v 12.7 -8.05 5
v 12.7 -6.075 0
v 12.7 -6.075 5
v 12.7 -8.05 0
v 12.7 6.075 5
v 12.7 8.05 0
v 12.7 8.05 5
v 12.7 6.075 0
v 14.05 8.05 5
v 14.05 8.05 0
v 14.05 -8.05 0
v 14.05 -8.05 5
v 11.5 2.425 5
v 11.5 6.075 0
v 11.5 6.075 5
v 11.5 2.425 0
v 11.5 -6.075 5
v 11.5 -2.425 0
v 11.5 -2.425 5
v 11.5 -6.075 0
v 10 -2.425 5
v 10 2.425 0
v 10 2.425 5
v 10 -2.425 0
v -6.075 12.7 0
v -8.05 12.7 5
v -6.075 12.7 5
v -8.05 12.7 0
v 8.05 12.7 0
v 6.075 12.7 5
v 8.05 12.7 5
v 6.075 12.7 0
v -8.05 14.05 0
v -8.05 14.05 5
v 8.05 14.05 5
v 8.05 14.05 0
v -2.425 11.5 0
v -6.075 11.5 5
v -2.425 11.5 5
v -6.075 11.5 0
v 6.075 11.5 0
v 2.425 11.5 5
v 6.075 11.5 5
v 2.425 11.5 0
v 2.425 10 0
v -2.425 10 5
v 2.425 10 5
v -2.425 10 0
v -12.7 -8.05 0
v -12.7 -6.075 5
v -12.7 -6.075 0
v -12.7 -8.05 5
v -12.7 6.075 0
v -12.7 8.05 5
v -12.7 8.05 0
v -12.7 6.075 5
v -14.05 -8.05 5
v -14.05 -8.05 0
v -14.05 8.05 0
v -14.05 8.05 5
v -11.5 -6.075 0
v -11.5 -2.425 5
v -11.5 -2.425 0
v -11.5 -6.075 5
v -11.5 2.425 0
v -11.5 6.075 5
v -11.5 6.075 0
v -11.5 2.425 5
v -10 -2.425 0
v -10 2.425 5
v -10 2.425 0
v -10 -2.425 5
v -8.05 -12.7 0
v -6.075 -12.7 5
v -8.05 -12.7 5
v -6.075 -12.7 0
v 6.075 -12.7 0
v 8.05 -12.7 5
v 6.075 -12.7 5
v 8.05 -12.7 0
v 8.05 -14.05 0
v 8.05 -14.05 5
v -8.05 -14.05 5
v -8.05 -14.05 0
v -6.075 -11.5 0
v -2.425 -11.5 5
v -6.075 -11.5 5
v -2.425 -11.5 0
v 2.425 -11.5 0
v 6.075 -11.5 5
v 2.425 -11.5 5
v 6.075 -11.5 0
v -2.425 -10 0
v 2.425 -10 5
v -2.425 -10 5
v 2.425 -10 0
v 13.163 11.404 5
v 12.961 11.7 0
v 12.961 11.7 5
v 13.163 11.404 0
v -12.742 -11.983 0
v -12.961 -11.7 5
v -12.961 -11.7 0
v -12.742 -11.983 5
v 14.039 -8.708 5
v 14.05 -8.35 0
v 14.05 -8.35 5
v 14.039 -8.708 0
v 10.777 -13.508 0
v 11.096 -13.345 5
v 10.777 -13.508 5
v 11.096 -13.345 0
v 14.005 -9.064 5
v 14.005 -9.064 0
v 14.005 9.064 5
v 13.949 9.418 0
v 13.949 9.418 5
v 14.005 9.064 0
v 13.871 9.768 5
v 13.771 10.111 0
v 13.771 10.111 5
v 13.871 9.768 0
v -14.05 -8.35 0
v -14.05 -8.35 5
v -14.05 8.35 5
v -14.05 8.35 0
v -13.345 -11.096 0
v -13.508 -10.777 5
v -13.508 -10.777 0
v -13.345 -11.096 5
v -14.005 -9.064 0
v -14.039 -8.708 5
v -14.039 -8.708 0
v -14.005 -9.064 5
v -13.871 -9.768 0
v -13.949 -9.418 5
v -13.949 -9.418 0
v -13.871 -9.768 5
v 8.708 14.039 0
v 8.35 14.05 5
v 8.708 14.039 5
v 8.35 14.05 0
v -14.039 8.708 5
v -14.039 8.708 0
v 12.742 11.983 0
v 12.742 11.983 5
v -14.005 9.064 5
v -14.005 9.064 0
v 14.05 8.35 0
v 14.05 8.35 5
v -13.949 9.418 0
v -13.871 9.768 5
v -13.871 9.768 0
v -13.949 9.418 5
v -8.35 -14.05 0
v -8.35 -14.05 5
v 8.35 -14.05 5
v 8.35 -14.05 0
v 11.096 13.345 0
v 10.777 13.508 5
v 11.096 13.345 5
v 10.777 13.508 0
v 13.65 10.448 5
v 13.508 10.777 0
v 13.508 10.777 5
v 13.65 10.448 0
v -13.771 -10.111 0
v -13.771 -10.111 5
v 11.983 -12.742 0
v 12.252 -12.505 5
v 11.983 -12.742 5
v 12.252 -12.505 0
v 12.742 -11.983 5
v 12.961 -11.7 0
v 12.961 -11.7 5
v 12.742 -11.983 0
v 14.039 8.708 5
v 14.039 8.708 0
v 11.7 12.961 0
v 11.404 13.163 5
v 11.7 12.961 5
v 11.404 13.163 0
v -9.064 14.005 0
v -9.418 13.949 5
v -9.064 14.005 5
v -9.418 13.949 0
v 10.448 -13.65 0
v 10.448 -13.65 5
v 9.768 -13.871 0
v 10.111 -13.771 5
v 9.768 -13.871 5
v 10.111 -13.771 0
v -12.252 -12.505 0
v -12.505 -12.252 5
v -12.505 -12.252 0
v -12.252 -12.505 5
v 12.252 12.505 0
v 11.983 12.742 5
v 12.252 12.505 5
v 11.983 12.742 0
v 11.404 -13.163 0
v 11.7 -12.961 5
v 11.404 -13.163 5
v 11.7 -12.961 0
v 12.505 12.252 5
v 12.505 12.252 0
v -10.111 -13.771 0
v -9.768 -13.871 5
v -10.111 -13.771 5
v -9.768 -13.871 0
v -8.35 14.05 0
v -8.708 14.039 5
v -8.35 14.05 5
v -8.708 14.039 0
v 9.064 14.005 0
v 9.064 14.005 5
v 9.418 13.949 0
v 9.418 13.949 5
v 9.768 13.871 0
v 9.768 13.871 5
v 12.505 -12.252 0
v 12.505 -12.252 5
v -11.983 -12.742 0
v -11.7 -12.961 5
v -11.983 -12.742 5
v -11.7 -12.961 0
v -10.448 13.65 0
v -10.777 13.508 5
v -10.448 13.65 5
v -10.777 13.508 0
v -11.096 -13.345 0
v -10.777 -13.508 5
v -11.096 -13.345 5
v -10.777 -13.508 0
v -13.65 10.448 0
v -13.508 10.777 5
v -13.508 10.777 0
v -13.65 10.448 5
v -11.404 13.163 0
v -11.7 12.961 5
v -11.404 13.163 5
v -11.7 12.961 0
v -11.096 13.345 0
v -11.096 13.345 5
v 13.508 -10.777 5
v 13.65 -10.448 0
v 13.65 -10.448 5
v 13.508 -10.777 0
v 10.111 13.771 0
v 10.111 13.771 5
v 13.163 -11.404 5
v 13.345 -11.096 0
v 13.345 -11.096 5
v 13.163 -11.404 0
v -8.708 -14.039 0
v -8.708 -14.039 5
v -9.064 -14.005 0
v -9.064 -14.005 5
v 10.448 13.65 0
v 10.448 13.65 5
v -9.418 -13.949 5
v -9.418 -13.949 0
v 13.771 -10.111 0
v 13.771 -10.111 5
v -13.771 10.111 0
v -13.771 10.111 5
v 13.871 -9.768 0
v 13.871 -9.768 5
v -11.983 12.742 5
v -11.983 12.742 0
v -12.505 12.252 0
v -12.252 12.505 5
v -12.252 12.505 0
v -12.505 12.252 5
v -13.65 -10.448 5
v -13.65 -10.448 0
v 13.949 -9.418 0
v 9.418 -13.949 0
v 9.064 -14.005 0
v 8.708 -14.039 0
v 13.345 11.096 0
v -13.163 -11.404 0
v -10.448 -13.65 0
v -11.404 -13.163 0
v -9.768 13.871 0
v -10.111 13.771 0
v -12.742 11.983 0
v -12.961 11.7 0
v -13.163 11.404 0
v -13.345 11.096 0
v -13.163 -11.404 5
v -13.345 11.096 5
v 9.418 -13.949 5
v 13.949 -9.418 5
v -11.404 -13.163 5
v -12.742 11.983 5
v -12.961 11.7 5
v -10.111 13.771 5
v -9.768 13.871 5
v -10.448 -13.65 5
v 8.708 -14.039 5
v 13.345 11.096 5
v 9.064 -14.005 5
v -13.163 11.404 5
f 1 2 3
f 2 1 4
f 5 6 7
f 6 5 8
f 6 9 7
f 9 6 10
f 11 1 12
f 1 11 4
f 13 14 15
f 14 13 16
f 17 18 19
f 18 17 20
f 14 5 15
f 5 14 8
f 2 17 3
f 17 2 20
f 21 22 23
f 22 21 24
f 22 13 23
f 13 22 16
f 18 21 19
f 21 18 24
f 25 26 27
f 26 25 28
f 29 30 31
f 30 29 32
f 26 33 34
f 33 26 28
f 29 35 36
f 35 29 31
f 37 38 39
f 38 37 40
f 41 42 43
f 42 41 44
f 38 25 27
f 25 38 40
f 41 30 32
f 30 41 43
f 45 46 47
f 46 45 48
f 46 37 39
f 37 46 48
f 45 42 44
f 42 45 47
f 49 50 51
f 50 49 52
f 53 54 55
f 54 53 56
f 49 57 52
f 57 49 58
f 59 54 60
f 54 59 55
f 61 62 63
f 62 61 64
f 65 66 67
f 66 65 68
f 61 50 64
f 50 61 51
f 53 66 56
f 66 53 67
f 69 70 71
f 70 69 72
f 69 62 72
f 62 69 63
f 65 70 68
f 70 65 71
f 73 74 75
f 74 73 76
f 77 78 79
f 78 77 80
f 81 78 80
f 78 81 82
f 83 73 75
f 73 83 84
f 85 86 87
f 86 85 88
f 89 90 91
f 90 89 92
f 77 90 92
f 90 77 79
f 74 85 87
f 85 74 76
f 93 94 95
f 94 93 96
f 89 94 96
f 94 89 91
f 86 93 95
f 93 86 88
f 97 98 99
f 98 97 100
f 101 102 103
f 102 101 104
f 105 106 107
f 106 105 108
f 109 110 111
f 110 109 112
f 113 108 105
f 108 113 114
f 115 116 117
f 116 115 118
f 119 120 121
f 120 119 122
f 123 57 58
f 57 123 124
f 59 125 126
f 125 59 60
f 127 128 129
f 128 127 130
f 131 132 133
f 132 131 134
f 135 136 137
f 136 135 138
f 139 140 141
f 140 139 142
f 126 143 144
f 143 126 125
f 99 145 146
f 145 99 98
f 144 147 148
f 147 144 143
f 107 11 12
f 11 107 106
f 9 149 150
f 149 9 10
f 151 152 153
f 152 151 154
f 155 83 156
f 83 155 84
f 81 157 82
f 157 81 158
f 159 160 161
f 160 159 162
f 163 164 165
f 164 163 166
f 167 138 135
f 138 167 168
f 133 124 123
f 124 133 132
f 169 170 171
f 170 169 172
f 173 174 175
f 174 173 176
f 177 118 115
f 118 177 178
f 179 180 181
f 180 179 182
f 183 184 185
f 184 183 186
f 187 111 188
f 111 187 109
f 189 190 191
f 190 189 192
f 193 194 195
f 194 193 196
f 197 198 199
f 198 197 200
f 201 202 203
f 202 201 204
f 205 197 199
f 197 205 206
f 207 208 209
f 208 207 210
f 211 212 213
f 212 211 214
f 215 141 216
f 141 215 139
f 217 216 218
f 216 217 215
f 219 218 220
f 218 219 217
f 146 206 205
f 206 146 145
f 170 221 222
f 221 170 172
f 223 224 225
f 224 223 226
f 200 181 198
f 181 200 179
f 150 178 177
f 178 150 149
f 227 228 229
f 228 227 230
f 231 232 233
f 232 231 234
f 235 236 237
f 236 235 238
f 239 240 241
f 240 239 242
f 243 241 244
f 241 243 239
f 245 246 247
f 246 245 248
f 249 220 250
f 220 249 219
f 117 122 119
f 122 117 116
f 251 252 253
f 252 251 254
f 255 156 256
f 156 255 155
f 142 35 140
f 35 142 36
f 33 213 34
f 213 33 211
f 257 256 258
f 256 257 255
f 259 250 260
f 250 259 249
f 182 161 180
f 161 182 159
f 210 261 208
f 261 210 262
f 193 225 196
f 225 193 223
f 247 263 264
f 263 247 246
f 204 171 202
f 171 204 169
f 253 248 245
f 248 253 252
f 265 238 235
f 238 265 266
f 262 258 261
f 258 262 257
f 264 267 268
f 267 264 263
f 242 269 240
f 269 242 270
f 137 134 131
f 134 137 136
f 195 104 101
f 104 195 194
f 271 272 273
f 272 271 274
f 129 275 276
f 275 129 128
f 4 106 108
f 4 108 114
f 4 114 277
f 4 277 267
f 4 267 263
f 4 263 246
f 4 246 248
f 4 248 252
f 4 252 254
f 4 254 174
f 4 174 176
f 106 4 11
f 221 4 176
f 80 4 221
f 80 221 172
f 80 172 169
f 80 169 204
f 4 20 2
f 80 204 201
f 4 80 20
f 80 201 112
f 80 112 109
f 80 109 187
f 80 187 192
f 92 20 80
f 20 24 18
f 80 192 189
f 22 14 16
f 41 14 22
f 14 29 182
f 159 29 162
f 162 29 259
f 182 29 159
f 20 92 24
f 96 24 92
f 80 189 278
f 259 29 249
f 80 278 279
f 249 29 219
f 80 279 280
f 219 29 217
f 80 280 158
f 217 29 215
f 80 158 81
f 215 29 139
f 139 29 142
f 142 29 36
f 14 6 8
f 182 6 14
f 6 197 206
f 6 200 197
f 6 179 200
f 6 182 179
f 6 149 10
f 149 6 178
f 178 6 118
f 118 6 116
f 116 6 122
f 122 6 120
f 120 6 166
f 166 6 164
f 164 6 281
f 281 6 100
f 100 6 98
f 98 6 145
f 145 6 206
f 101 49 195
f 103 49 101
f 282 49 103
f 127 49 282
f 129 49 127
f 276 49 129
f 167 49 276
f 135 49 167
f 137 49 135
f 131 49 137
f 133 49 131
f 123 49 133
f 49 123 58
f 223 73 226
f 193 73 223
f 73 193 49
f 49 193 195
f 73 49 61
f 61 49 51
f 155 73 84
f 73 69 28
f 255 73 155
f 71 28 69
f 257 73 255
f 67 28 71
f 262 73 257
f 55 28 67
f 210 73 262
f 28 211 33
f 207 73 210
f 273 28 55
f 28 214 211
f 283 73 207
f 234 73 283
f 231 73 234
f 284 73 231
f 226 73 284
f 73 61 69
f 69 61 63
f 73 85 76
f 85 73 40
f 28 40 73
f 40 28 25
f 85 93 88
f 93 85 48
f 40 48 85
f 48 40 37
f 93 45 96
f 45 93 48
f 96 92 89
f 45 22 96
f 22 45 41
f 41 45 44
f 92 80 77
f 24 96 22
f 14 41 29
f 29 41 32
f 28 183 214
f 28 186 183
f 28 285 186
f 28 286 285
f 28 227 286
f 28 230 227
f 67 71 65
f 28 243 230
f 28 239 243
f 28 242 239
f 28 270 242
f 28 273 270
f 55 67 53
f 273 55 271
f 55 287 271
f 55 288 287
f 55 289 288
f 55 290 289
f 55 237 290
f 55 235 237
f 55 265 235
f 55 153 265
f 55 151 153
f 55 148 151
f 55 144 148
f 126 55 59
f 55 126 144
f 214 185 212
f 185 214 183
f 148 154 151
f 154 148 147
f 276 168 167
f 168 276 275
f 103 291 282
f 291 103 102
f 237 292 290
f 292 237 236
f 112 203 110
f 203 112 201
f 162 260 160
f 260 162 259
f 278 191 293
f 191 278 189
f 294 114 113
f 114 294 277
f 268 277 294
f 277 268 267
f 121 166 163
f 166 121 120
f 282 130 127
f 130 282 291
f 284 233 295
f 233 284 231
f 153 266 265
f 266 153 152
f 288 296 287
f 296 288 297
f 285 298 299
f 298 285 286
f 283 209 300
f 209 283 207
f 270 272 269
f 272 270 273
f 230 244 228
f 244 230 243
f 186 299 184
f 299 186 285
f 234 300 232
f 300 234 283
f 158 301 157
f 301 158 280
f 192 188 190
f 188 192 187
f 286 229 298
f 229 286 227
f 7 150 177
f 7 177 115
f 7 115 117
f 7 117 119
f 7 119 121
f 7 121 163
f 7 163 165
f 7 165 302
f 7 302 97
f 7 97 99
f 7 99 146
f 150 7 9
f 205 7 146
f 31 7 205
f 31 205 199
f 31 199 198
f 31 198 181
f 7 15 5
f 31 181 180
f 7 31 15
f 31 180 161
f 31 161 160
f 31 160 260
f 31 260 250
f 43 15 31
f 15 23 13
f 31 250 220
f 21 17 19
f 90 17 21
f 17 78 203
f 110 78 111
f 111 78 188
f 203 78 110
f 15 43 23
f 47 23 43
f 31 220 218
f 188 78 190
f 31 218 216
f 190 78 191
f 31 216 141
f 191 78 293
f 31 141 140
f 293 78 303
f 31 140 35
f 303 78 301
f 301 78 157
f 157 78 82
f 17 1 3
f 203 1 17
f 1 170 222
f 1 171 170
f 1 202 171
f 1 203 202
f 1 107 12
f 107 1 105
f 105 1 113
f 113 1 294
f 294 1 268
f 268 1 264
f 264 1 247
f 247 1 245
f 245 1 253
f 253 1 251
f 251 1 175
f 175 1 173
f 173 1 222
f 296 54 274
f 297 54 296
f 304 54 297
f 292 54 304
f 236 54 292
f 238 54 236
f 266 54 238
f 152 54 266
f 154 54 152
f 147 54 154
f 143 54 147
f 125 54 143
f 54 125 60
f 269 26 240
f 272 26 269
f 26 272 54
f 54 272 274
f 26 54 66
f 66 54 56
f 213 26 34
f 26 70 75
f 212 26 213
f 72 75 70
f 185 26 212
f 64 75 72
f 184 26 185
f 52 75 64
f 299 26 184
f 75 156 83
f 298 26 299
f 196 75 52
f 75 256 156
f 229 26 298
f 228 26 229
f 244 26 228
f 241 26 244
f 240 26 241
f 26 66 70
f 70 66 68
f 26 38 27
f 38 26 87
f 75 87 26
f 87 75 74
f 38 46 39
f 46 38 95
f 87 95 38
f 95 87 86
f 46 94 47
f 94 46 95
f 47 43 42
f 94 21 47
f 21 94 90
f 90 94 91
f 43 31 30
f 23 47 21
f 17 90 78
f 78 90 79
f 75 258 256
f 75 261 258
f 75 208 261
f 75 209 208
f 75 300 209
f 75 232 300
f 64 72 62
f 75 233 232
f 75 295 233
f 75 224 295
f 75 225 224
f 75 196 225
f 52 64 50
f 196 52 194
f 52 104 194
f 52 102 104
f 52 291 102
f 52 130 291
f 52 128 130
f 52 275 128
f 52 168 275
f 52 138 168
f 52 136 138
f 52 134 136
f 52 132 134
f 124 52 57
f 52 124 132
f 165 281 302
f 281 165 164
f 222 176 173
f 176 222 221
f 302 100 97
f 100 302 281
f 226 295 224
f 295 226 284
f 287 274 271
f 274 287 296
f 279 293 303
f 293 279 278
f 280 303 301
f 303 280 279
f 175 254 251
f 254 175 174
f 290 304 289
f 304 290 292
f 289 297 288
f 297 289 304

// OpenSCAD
frame_profile(h = 5);
/*
difference()
{
	translate([5, 0, 0]) cube([26, 35, 5], center = true);
	translate([0, 0, -10 / 2]) frame_profile(10);
}
*/

module frame_profile(h)
{
	$fn = 100;

	// p = profile
	p_width = 27.5 + 0.2;
	p_corner_r = 5.7;
	p_first_step_width = 16.3 - 0.2;
	p_first_step_height = 1.15;
	p_second_step_width = 12.35 - 0.2;
	p_second_step_height = 1.2;
	p_third_step_width = 5.05 - 0.2;
	p_third_step_height = 1.5; // 6.15;

	difference()
	{
		hull()
		{
			translate([(p_width / 2) - p_corner_r + 0.2, (p_width / 2) - p_corner_r + 0.2, 0])
				cylinder(r = p_corner_r, h = h);
	
			translate([(p_width / 2) - p_corner_r + 0.2, -((p_width / 2) - p_corner_r + 0.2), 0])
				cylinder(r = p_corner_r, h = h);
	
			translate([-((p_width / 2) - p_corner_r + 0.2), (p_width / 2) - p_corner_r + 0.2, 0])
				cylinder(r = p_corner_r, h = h);
	
			translate(-[(p_width / 2) - p_corner_r + 0.2, (p_width / 2) - p_corner_r + 0.2, 0])
				cylinder(r = p_corner_r, h = h);
		}

		for( i = [0 : 1 : 3] )
		{
			rotate(i * 90, v = [0, 0, 1])
				translate([(p_width / 2) - p_first_step_height, -(p_first_step_width / 2), -1])
					cube([p_first_step_width, p_first_step_width, (h + 2)]);

			rotate(i * 90, v = [0, 0, 1])
				translate([(p_width / 2) - p_second_step_height - p_first_step_height, -(p_second_step_width / 2), -1])
					cube([p_second_step_width, p_second_step_width, (h + 2)]);

			rotate(i * 90, v = [0, 0, 1])
				translate([(p_width / 2) - p_third_step_height - p_second_step_height - p_first_step_height, -(p_third_step_width / 2), -1])
					cube([p_third_step_width, p_third_step_width, (h + 2)]);
		}
	}
}
